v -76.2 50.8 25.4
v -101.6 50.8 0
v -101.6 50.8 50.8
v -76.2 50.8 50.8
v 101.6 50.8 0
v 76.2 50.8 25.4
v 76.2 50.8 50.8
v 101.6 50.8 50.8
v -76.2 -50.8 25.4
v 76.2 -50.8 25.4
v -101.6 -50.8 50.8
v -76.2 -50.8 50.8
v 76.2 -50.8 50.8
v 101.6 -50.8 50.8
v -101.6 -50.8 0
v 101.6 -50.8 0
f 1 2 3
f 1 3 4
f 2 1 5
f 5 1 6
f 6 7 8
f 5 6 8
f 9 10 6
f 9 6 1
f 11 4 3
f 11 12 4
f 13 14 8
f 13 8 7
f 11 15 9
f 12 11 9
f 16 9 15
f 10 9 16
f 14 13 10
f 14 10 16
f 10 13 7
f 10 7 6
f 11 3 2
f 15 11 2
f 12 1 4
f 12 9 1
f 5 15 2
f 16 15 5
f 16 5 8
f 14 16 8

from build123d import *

# Parameters (mm, degrees)
F1_DEPTH      = 50.8
F1_DEPTH_BACK = 50.8


with BuildPart() as f1:
    # F0 (on Front) → F1 (new body, two sides)
    with BuildSketch(Plane.XZ) as f1_sk:
        Polygon((-101.6, 50.8), (-101.6, 0), (101.6, 0), (101.6, 50.8), (76.2, 50.8), (76.2, 25.4), (-76.2, 25.4), (-76.2, 50.8), align=None)
    extrude(amount=F1_DEPTH)
    extrude(f1_sk.sketch, amount=-F1_DEPTH_BACK)


solid = f1.part
